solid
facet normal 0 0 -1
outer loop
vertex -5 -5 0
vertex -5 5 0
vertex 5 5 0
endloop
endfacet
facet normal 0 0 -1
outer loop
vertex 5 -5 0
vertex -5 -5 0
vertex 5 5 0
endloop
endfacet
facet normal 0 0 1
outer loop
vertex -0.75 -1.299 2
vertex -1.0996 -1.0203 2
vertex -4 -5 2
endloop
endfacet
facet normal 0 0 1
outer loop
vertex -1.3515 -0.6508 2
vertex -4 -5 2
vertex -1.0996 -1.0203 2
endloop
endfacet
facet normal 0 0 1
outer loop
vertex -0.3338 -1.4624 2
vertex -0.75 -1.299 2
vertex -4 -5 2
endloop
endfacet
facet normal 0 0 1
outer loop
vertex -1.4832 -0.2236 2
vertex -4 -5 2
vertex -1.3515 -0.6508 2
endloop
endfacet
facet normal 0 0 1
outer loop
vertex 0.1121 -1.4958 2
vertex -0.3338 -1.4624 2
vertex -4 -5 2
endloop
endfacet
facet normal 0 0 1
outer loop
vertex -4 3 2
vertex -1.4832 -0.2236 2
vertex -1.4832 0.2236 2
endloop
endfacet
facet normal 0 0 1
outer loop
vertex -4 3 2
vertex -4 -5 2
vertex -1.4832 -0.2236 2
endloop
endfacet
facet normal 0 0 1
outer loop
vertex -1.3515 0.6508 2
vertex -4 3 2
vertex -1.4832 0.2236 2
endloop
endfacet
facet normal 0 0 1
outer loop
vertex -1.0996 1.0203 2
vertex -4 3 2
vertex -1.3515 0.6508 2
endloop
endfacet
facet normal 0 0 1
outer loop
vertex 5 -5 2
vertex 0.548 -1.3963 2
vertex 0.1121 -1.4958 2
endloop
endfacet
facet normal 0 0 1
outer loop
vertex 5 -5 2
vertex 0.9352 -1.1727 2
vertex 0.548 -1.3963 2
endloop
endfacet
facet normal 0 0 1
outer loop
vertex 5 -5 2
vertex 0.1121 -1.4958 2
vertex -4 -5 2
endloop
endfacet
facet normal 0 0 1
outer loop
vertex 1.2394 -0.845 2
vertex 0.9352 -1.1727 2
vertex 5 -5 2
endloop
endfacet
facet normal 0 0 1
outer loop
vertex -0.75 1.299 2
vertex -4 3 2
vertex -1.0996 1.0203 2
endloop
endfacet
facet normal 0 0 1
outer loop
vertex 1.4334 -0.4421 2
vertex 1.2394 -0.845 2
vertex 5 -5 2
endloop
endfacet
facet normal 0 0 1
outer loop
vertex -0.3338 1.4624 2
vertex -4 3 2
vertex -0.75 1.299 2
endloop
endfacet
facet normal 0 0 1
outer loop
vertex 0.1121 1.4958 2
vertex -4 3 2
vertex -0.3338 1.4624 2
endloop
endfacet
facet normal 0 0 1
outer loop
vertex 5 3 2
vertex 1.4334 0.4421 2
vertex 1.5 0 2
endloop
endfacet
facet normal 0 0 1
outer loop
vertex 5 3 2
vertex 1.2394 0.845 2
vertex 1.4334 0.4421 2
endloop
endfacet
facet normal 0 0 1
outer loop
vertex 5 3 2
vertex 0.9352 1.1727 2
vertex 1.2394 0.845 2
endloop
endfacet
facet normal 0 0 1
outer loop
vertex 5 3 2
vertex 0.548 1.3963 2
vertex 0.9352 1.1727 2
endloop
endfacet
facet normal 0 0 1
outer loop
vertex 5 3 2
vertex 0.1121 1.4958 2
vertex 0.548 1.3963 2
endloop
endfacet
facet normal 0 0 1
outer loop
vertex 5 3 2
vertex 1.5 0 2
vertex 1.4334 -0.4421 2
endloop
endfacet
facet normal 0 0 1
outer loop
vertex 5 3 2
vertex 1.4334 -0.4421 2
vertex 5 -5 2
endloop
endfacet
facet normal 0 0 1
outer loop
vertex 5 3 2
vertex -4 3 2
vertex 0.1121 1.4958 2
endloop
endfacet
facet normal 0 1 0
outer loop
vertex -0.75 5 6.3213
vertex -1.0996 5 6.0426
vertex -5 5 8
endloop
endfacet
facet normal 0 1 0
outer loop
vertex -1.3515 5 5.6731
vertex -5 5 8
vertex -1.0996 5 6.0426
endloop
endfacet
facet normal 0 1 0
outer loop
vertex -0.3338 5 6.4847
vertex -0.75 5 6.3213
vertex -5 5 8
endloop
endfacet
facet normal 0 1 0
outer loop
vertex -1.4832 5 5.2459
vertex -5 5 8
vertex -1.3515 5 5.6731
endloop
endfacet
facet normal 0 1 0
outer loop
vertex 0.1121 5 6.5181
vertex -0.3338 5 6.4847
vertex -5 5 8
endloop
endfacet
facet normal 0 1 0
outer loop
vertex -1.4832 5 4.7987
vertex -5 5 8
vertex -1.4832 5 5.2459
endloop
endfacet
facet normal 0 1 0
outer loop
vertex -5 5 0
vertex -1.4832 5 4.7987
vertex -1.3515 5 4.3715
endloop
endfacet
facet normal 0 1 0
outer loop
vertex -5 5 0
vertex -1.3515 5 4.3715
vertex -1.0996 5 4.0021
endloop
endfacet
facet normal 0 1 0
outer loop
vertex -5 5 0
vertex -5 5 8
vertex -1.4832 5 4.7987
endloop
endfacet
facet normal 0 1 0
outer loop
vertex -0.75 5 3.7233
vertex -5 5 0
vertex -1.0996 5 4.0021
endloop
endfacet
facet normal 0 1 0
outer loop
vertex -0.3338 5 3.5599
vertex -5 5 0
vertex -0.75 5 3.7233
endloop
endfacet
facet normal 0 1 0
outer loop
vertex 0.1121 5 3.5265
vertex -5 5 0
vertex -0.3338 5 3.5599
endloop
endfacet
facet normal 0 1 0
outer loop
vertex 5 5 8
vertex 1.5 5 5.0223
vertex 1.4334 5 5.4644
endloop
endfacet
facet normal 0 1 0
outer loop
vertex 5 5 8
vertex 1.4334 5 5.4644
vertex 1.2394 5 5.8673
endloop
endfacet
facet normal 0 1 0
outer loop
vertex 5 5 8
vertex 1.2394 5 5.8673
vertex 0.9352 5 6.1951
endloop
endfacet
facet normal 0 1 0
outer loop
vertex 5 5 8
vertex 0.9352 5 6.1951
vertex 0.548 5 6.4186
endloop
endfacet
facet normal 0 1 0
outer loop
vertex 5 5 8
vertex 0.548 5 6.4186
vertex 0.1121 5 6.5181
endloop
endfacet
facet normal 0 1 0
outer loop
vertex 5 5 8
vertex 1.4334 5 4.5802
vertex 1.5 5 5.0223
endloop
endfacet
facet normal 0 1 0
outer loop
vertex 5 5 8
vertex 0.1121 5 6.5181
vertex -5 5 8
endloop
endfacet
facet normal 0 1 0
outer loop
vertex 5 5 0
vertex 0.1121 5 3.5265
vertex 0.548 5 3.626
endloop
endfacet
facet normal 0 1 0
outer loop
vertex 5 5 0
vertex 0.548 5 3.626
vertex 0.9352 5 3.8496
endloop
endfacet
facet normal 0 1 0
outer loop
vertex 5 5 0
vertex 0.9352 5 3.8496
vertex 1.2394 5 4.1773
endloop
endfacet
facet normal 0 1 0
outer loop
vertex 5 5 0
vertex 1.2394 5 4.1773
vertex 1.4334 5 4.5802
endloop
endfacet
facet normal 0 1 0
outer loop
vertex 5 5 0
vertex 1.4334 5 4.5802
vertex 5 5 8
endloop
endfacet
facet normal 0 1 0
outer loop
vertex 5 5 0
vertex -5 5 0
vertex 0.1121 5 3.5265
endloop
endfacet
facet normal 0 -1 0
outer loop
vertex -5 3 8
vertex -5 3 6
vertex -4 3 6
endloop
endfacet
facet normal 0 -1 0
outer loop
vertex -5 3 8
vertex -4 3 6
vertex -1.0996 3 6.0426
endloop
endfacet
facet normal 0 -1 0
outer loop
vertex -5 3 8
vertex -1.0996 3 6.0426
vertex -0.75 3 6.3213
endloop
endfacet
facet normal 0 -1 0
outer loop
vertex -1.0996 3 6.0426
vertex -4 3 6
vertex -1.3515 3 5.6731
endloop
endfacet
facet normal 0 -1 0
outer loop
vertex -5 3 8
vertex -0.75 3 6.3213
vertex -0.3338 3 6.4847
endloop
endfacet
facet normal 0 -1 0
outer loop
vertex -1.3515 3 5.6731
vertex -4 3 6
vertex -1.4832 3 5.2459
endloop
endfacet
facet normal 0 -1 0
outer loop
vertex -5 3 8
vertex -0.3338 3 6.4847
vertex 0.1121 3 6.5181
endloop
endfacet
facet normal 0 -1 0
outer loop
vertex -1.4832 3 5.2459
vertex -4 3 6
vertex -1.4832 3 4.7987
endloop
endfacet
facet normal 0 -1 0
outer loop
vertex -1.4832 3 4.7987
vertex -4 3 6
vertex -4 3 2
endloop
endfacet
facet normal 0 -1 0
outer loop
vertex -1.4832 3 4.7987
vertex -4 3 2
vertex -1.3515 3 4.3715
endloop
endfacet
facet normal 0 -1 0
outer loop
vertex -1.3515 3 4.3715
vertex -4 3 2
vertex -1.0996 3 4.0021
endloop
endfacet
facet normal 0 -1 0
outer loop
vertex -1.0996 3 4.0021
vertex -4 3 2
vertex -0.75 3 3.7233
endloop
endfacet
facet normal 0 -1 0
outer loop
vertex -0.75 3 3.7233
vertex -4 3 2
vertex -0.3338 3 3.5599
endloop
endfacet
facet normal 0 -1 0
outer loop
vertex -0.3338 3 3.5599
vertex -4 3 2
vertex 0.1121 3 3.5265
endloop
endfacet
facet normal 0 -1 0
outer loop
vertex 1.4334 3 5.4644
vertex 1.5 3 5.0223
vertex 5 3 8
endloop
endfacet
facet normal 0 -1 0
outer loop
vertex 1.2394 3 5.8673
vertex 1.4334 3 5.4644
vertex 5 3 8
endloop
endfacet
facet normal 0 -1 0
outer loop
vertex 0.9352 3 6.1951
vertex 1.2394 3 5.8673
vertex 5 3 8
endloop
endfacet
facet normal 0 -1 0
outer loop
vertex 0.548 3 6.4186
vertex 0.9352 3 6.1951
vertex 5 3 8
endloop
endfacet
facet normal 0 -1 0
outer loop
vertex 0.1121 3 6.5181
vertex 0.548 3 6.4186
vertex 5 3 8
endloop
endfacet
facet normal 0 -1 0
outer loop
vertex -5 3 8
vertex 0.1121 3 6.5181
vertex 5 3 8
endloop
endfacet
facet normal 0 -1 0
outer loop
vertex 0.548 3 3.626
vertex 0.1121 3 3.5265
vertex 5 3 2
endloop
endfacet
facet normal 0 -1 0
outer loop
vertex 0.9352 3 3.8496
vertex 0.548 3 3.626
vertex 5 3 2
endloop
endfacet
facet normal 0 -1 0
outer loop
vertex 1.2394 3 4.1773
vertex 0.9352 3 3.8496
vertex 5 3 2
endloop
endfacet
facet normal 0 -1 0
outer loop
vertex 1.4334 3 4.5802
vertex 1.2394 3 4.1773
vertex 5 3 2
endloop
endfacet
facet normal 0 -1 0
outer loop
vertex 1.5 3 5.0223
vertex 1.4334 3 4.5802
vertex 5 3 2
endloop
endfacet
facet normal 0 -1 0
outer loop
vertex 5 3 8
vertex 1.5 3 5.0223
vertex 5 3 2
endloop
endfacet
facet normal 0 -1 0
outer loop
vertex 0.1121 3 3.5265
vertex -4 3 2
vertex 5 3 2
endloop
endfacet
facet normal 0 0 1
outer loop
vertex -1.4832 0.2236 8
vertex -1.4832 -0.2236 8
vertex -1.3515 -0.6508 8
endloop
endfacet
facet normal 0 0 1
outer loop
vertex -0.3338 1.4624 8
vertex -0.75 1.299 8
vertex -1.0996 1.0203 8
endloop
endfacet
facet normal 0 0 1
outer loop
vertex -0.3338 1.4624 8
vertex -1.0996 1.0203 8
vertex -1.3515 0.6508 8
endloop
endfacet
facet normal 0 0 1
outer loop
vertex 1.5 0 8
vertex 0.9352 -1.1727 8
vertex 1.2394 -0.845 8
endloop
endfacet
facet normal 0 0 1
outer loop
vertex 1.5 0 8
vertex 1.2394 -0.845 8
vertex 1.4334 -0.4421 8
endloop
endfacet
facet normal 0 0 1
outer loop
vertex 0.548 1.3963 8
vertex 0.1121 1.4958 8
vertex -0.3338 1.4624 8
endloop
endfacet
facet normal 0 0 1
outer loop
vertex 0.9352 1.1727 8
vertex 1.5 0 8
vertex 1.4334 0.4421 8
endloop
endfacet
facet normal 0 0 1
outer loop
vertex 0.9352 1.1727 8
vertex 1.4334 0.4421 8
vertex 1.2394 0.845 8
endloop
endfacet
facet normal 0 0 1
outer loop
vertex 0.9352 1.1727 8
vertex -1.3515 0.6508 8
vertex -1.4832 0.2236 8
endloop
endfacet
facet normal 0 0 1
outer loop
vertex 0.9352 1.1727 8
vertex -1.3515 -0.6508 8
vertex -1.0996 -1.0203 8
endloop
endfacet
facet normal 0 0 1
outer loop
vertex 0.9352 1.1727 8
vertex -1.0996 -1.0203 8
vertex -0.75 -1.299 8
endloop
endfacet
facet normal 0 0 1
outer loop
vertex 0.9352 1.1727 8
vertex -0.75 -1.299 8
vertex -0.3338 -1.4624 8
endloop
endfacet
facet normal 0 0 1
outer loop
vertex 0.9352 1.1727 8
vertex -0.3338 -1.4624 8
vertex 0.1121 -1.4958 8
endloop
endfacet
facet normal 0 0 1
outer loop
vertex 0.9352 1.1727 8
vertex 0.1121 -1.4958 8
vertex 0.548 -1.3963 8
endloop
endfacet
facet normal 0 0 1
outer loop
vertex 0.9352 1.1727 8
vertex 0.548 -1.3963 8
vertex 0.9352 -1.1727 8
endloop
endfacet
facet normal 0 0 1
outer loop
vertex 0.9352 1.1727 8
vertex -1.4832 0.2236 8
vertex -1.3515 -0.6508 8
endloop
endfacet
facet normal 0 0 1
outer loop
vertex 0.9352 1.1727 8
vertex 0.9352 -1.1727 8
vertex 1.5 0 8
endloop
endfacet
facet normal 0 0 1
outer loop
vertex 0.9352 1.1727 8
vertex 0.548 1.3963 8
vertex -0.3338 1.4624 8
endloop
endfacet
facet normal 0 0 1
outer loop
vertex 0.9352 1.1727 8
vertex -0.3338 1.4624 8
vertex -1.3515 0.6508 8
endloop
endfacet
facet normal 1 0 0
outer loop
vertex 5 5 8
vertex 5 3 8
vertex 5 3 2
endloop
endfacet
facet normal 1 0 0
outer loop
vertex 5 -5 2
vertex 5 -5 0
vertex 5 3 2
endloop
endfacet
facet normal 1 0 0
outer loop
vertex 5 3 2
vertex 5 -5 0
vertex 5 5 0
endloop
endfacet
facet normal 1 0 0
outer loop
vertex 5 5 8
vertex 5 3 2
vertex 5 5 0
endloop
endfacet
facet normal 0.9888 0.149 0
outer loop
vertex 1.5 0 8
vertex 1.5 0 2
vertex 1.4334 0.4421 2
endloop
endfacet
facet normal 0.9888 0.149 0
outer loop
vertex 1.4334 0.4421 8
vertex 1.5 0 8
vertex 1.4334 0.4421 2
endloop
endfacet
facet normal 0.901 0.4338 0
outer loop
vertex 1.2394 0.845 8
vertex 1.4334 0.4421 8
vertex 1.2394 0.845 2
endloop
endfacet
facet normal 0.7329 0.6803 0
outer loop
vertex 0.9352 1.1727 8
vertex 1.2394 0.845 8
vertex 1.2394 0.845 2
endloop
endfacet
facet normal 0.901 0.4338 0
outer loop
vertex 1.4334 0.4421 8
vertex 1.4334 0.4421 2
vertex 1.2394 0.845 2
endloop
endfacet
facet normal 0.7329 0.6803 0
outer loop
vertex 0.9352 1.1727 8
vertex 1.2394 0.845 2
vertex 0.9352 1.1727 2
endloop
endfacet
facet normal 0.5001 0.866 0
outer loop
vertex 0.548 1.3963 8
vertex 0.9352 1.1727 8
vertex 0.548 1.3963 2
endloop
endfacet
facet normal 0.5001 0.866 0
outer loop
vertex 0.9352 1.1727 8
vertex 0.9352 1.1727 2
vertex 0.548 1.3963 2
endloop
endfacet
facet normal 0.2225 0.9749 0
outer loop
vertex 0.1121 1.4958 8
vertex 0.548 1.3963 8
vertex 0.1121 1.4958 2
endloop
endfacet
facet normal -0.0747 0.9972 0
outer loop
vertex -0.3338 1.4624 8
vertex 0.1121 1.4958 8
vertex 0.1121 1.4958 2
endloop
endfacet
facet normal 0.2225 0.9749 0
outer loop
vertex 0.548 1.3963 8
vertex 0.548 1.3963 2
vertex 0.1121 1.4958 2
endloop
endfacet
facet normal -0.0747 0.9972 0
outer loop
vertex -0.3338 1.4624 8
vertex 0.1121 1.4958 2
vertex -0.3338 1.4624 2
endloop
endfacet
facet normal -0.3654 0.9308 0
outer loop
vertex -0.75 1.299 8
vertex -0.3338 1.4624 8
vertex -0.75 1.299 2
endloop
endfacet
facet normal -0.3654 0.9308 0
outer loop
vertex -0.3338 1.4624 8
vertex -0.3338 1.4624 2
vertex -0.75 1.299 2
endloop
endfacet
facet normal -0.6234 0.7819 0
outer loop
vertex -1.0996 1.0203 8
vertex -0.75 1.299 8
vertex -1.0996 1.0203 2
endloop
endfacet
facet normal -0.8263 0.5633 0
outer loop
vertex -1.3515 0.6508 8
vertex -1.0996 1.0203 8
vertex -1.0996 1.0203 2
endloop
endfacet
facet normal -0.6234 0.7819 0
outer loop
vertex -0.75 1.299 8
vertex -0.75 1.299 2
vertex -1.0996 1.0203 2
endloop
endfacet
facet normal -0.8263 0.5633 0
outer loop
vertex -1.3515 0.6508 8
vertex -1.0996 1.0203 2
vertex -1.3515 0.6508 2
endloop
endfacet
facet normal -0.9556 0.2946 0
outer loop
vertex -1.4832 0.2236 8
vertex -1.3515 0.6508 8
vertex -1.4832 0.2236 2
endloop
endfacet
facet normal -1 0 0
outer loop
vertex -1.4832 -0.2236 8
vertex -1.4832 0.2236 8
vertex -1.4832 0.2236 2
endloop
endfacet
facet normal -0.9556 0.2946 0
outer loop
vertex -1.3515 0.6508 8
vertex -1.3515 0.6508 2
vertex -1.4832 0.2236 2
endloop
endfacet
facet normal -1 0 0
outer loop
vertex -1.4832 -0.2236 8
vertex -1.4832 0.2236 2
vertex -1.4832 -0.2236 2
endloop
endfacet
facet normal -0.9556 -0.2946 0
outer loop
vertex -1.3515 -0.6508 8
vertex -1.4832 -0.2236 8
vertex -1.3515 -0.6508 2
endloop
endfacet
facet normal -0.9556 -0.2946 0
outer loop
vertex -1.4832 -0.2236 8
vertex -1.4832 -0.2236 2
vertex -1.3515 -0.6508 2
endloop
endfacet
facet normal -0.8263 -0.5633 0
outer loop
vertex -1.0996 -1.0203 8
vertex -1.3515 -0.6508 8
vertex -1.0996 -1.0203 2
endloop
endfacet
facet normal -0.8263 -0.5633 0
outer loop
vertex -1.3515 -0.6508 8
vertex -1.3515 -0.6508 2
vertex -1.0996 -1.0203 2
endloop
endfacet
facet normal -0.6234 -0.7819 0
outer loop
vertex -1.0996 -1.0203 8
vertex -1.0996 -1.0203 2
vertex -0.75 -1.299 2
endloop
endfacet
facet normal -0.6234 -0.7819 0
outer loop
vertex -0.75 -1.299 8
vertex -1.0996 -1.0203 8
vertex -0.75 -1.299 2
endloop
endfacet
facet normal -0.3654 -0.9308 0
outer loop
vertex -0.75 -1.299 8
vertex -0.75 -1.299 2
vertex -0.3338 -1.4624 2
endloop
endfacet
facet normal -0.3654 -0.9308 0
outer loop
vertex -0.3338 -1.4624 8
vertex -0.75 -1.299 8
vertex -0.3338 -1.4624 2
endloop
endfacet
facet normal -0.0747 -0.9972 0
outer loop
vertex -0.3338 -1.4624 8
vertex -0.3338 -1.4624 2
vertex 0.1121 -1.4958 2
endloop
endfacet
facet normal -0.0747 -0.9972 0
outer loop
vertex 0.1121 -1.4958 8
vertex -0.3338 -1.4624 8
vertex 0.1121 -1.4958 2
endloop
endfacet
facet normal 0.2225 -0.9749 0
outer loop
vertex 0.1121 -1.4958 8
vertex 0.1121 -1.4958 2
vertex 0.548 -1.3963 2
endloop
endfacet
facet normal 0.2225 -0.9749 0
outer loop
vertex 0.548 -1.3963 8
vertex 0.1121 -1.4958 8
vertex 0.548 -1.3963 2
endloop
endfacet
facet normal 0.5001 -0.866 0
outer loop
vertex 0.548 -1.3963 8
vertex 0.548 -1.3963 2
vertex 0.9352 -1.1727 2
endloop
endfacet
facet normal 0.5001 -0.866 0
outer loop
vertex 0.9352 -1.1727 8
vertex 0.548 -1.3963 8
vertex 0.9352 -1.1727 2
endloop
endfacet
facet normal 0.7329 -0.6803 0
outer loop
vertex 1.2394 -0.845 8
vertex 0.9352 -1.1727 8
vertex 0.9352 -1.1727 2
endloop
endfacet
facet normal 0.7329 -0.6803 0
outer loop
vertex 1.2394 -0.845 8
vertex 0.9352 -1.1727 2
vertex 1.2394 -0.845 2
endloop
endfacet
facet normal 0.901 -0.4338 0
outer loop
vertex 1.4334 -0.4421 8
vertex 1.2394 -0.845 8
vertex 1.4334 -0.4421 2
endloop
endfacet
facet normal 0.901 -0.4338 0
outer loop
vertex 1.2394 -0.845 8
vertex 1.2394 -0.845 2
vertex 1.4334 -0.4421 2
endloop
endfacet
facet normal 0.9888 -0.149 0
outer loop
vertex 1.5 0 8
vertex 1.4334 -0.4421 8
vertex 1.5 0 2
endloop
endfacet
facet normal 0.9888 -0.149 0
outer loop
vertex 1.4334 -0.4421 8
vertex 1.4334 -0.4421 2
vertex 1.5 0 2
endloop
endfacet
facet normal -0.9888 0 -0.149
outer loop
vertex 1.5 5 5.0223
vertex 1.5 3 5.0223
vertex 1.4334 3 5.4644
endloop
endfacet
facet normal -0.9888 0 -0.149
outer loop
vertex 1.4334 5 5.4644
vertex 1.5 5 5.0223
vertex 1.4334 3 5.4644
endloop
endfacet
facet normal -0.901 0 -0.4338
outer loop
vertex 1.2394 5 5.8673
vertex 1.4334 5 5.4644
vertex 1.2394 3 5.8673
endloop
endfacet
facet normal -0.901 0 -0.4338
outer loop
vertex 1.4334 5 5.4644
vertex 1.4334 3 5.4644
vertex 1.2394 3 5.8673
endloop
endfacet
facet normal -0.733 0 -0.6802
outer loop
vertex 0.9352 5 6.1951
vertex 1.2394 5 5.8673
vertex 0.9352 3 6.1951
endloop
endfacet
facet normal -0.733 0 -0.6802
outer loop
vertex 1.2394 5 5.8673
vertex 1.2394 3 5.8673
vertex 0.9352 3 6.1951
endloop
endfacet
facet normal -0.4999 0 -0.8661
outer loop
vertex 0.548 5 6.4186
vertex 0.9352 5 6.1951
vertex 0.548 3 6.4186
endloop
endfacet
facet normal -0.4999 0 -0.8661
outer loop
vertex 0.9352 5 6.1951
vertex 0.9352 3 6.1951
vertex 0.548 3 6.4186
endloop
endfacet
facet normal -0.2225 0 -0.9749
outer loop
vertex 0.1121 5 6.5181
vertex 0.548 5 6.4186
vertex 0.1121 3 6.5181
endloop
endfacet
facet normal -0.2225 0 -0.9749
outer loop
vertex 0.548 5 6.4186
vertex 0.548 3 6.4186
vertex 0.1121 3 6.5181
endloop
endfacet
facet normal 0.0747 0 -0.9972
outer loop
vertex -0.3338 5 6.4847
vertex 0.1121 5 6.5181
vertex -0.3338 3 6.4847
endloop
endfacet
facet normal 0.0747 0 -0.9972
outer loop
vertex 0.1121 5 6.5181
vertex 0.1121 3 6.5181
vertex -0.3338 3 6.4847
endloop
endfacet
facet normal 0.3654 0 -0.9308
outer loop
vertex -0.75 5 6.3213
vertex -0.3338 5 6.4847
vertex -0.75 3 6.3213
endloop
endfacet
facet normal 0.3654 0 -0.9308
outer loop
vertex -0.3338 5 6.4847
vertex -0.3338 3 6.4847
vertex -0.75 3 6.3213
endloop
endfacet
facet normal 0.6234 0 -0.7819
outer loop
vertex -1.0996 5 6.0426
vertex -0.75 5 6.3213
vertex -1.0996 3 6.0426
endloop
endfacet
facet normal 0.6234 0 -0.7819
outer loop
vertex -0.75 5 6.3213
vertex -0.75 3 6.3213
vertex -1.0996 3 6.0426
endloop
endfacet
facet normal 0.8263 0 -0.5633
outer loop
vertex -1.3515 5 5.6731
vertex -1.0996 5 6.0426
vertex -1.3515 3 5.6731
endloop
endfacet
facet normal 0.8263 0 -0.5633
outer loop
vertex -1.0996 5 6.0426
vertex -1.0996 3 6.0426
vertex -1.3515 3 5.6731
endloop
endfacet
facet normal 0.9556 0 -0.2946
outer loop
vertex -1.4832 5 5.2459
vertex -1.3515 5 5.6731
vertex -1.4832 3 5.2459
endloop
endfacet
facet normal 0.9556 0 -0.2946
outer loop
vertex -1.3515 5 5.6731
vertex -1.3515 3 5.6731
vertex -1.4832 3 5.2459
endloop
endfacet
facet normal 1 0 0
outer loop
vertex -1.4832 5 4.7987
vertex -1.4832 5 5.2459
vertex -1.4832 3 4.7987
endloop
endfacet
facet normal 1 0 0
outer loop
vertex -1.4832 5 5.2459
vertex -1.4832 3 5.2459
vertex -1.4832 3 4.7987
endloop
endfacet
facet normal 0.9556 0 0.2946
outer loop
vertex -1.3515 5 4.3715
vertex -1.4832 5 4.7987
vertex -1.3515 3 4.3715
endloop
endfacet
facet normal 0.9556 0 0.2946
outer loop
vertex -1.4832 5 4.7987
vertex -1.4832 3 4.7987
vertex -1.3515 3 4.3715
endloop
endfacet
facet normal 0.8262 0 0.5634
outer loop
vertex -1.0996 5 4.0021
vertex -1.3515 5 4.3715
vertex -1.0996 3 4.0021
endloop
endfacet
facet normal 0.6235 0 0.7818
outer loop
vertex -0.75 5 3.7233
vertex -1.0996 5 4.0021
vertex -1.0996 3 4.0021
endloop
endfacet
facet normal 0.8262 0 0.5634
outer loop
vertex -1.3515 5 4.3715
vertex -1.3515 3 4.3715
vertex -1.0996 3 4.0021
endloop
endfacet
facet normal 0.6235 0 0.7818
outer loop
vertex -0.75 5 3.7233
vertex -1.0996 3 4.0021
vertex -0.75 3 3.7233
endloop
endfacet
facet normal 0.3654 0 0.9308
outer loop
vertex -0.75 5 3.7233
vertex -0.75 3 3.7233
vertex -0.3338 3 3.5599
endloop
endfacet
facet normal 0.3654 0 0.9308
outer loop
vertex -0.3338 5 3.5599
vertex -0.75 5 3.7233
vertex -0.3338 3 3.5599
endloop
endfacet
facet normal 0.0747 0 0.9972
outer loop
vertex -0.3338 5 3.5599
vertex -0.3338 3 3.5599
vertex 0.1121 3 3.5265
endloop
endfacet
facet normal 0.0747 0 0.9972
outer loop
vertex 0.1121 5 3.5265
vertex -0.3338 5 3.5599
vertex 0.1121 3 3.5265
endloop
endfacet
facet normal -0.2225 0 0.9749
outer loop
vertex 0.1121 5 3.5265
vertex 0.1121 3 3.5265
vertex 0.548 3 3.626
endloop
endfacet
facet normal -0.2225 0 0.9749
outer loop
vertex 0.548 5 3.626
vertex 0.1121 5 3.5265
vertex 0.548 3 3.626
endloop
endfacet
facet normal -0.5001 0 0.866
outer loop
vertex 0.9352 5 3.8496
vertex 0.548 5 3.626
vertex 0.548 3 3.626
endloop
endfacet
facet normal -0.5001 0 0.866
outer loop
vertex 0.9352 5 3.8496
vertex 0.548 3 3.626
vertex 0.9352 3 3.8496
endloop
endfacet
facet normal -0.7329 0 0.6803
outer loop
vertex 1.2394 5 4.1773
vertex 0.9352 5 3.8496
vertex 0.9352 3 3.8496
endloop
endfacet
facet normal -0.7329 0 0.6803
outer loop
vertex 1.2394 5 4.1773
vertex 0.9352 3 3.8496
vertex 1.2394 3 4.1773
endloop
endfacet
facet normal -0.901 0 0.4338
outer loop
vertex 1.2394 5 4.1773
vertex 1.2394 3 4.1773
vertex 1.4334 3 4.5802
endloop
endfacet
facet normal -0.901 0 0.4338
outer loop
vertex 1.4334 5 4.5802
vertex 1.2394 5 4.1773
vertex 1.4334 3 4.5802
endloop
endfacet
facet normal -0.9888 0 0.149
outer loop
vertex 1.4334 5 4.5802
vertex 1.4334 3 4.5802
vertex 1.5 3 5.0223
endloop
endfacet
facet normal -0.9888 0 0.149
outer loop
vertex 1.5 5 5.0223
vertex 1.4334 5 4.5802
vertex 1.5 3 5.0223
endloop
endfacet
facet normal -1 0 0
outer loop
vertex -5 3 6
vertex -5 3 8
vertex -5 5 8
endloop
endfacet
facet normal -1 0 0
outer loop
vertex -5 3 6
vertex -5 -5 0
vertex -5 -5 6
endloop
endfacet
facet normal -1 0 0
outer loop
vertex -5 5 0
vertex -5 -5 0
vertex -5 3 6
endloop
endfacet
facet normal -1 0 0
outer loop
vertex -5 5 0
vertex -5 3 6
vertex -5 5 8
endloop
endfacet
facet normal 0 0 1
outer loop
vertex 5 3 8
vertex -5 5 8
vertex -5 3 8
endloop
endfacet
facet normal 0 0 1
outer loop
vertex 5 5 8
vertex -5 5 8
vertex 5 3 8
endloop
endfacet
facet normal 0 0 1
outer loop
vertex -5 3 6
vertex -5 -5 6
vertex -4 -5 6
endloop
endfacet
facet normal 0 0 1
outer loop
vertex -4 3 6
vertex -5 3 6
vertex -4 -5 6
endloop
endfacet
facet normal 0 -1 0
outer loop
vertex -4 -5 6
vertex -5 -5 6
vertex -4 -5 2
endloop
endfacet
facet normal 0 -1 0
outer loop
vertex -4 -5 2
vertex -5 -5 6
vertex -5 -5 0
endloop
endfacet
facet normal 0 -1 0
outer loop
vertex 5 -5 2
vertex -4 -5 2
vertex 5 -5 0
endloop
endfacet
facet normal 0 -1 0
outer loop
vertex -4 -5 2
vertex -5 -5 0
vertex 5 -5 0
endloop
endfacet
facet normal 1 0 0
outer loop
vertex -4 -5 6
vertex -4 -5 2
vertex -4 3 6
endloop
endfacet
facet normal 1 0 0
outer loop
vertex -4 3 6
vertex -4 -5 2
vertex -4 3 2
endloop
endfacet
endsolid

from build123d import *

# Parameters (mm, degrees)
F0_W     = 10
F0_H     = 10
F1_DEPTH = 2
F2_W     = 10
F2_H     = 2
F3_DEPTH = 6
F4_R     = 1.5
F5_DEPTH = 25
F6_R     = 1.5
F7_DEPTH = 6
F8_W     = 1
F8_H     = 8
F9_DEPTH = 4


with BuildPart() as f1:
    # F0 (on Top) → F1 (new body)
    with BuildSketch(Plane.XY):
        Rectangle(F0_W, F0_H)
    extrude(amount=F1_DEPTH)

    # F2 (on face) → F3 (join)
    with BuildSketch(Plane.XY.offset(2)):
        with Locations((0, 4)):
            Rectangle(F2_W, F2_H)
    extrude(amount=F3_DEPTH)

    # F4 (on face) → F5 (cut)
    with BuildSketch(Plane.XZ.offset(-3)):
        with Locations((0, 5.022311)):
            Circle(F4_R)
    extrude(amount=-F5_DEPTH, mode=Mode.SUBTRACT)

    # F6 (on face) → F7 (join)
    with BuildSketch(Plane.XY.offset(2)):
        Circle(F6_R)
    extrude(amount=F7_DEPTH)

    # F8 (on face) → F9 (join)
    with BuildSketch(Plane.XY.offset(2)):
        with Locations((-4.5, -1)):
            Rectangle(F8_W, F8_H)
    extrude(amount=F9_DEPTH)


solid = f1.part
